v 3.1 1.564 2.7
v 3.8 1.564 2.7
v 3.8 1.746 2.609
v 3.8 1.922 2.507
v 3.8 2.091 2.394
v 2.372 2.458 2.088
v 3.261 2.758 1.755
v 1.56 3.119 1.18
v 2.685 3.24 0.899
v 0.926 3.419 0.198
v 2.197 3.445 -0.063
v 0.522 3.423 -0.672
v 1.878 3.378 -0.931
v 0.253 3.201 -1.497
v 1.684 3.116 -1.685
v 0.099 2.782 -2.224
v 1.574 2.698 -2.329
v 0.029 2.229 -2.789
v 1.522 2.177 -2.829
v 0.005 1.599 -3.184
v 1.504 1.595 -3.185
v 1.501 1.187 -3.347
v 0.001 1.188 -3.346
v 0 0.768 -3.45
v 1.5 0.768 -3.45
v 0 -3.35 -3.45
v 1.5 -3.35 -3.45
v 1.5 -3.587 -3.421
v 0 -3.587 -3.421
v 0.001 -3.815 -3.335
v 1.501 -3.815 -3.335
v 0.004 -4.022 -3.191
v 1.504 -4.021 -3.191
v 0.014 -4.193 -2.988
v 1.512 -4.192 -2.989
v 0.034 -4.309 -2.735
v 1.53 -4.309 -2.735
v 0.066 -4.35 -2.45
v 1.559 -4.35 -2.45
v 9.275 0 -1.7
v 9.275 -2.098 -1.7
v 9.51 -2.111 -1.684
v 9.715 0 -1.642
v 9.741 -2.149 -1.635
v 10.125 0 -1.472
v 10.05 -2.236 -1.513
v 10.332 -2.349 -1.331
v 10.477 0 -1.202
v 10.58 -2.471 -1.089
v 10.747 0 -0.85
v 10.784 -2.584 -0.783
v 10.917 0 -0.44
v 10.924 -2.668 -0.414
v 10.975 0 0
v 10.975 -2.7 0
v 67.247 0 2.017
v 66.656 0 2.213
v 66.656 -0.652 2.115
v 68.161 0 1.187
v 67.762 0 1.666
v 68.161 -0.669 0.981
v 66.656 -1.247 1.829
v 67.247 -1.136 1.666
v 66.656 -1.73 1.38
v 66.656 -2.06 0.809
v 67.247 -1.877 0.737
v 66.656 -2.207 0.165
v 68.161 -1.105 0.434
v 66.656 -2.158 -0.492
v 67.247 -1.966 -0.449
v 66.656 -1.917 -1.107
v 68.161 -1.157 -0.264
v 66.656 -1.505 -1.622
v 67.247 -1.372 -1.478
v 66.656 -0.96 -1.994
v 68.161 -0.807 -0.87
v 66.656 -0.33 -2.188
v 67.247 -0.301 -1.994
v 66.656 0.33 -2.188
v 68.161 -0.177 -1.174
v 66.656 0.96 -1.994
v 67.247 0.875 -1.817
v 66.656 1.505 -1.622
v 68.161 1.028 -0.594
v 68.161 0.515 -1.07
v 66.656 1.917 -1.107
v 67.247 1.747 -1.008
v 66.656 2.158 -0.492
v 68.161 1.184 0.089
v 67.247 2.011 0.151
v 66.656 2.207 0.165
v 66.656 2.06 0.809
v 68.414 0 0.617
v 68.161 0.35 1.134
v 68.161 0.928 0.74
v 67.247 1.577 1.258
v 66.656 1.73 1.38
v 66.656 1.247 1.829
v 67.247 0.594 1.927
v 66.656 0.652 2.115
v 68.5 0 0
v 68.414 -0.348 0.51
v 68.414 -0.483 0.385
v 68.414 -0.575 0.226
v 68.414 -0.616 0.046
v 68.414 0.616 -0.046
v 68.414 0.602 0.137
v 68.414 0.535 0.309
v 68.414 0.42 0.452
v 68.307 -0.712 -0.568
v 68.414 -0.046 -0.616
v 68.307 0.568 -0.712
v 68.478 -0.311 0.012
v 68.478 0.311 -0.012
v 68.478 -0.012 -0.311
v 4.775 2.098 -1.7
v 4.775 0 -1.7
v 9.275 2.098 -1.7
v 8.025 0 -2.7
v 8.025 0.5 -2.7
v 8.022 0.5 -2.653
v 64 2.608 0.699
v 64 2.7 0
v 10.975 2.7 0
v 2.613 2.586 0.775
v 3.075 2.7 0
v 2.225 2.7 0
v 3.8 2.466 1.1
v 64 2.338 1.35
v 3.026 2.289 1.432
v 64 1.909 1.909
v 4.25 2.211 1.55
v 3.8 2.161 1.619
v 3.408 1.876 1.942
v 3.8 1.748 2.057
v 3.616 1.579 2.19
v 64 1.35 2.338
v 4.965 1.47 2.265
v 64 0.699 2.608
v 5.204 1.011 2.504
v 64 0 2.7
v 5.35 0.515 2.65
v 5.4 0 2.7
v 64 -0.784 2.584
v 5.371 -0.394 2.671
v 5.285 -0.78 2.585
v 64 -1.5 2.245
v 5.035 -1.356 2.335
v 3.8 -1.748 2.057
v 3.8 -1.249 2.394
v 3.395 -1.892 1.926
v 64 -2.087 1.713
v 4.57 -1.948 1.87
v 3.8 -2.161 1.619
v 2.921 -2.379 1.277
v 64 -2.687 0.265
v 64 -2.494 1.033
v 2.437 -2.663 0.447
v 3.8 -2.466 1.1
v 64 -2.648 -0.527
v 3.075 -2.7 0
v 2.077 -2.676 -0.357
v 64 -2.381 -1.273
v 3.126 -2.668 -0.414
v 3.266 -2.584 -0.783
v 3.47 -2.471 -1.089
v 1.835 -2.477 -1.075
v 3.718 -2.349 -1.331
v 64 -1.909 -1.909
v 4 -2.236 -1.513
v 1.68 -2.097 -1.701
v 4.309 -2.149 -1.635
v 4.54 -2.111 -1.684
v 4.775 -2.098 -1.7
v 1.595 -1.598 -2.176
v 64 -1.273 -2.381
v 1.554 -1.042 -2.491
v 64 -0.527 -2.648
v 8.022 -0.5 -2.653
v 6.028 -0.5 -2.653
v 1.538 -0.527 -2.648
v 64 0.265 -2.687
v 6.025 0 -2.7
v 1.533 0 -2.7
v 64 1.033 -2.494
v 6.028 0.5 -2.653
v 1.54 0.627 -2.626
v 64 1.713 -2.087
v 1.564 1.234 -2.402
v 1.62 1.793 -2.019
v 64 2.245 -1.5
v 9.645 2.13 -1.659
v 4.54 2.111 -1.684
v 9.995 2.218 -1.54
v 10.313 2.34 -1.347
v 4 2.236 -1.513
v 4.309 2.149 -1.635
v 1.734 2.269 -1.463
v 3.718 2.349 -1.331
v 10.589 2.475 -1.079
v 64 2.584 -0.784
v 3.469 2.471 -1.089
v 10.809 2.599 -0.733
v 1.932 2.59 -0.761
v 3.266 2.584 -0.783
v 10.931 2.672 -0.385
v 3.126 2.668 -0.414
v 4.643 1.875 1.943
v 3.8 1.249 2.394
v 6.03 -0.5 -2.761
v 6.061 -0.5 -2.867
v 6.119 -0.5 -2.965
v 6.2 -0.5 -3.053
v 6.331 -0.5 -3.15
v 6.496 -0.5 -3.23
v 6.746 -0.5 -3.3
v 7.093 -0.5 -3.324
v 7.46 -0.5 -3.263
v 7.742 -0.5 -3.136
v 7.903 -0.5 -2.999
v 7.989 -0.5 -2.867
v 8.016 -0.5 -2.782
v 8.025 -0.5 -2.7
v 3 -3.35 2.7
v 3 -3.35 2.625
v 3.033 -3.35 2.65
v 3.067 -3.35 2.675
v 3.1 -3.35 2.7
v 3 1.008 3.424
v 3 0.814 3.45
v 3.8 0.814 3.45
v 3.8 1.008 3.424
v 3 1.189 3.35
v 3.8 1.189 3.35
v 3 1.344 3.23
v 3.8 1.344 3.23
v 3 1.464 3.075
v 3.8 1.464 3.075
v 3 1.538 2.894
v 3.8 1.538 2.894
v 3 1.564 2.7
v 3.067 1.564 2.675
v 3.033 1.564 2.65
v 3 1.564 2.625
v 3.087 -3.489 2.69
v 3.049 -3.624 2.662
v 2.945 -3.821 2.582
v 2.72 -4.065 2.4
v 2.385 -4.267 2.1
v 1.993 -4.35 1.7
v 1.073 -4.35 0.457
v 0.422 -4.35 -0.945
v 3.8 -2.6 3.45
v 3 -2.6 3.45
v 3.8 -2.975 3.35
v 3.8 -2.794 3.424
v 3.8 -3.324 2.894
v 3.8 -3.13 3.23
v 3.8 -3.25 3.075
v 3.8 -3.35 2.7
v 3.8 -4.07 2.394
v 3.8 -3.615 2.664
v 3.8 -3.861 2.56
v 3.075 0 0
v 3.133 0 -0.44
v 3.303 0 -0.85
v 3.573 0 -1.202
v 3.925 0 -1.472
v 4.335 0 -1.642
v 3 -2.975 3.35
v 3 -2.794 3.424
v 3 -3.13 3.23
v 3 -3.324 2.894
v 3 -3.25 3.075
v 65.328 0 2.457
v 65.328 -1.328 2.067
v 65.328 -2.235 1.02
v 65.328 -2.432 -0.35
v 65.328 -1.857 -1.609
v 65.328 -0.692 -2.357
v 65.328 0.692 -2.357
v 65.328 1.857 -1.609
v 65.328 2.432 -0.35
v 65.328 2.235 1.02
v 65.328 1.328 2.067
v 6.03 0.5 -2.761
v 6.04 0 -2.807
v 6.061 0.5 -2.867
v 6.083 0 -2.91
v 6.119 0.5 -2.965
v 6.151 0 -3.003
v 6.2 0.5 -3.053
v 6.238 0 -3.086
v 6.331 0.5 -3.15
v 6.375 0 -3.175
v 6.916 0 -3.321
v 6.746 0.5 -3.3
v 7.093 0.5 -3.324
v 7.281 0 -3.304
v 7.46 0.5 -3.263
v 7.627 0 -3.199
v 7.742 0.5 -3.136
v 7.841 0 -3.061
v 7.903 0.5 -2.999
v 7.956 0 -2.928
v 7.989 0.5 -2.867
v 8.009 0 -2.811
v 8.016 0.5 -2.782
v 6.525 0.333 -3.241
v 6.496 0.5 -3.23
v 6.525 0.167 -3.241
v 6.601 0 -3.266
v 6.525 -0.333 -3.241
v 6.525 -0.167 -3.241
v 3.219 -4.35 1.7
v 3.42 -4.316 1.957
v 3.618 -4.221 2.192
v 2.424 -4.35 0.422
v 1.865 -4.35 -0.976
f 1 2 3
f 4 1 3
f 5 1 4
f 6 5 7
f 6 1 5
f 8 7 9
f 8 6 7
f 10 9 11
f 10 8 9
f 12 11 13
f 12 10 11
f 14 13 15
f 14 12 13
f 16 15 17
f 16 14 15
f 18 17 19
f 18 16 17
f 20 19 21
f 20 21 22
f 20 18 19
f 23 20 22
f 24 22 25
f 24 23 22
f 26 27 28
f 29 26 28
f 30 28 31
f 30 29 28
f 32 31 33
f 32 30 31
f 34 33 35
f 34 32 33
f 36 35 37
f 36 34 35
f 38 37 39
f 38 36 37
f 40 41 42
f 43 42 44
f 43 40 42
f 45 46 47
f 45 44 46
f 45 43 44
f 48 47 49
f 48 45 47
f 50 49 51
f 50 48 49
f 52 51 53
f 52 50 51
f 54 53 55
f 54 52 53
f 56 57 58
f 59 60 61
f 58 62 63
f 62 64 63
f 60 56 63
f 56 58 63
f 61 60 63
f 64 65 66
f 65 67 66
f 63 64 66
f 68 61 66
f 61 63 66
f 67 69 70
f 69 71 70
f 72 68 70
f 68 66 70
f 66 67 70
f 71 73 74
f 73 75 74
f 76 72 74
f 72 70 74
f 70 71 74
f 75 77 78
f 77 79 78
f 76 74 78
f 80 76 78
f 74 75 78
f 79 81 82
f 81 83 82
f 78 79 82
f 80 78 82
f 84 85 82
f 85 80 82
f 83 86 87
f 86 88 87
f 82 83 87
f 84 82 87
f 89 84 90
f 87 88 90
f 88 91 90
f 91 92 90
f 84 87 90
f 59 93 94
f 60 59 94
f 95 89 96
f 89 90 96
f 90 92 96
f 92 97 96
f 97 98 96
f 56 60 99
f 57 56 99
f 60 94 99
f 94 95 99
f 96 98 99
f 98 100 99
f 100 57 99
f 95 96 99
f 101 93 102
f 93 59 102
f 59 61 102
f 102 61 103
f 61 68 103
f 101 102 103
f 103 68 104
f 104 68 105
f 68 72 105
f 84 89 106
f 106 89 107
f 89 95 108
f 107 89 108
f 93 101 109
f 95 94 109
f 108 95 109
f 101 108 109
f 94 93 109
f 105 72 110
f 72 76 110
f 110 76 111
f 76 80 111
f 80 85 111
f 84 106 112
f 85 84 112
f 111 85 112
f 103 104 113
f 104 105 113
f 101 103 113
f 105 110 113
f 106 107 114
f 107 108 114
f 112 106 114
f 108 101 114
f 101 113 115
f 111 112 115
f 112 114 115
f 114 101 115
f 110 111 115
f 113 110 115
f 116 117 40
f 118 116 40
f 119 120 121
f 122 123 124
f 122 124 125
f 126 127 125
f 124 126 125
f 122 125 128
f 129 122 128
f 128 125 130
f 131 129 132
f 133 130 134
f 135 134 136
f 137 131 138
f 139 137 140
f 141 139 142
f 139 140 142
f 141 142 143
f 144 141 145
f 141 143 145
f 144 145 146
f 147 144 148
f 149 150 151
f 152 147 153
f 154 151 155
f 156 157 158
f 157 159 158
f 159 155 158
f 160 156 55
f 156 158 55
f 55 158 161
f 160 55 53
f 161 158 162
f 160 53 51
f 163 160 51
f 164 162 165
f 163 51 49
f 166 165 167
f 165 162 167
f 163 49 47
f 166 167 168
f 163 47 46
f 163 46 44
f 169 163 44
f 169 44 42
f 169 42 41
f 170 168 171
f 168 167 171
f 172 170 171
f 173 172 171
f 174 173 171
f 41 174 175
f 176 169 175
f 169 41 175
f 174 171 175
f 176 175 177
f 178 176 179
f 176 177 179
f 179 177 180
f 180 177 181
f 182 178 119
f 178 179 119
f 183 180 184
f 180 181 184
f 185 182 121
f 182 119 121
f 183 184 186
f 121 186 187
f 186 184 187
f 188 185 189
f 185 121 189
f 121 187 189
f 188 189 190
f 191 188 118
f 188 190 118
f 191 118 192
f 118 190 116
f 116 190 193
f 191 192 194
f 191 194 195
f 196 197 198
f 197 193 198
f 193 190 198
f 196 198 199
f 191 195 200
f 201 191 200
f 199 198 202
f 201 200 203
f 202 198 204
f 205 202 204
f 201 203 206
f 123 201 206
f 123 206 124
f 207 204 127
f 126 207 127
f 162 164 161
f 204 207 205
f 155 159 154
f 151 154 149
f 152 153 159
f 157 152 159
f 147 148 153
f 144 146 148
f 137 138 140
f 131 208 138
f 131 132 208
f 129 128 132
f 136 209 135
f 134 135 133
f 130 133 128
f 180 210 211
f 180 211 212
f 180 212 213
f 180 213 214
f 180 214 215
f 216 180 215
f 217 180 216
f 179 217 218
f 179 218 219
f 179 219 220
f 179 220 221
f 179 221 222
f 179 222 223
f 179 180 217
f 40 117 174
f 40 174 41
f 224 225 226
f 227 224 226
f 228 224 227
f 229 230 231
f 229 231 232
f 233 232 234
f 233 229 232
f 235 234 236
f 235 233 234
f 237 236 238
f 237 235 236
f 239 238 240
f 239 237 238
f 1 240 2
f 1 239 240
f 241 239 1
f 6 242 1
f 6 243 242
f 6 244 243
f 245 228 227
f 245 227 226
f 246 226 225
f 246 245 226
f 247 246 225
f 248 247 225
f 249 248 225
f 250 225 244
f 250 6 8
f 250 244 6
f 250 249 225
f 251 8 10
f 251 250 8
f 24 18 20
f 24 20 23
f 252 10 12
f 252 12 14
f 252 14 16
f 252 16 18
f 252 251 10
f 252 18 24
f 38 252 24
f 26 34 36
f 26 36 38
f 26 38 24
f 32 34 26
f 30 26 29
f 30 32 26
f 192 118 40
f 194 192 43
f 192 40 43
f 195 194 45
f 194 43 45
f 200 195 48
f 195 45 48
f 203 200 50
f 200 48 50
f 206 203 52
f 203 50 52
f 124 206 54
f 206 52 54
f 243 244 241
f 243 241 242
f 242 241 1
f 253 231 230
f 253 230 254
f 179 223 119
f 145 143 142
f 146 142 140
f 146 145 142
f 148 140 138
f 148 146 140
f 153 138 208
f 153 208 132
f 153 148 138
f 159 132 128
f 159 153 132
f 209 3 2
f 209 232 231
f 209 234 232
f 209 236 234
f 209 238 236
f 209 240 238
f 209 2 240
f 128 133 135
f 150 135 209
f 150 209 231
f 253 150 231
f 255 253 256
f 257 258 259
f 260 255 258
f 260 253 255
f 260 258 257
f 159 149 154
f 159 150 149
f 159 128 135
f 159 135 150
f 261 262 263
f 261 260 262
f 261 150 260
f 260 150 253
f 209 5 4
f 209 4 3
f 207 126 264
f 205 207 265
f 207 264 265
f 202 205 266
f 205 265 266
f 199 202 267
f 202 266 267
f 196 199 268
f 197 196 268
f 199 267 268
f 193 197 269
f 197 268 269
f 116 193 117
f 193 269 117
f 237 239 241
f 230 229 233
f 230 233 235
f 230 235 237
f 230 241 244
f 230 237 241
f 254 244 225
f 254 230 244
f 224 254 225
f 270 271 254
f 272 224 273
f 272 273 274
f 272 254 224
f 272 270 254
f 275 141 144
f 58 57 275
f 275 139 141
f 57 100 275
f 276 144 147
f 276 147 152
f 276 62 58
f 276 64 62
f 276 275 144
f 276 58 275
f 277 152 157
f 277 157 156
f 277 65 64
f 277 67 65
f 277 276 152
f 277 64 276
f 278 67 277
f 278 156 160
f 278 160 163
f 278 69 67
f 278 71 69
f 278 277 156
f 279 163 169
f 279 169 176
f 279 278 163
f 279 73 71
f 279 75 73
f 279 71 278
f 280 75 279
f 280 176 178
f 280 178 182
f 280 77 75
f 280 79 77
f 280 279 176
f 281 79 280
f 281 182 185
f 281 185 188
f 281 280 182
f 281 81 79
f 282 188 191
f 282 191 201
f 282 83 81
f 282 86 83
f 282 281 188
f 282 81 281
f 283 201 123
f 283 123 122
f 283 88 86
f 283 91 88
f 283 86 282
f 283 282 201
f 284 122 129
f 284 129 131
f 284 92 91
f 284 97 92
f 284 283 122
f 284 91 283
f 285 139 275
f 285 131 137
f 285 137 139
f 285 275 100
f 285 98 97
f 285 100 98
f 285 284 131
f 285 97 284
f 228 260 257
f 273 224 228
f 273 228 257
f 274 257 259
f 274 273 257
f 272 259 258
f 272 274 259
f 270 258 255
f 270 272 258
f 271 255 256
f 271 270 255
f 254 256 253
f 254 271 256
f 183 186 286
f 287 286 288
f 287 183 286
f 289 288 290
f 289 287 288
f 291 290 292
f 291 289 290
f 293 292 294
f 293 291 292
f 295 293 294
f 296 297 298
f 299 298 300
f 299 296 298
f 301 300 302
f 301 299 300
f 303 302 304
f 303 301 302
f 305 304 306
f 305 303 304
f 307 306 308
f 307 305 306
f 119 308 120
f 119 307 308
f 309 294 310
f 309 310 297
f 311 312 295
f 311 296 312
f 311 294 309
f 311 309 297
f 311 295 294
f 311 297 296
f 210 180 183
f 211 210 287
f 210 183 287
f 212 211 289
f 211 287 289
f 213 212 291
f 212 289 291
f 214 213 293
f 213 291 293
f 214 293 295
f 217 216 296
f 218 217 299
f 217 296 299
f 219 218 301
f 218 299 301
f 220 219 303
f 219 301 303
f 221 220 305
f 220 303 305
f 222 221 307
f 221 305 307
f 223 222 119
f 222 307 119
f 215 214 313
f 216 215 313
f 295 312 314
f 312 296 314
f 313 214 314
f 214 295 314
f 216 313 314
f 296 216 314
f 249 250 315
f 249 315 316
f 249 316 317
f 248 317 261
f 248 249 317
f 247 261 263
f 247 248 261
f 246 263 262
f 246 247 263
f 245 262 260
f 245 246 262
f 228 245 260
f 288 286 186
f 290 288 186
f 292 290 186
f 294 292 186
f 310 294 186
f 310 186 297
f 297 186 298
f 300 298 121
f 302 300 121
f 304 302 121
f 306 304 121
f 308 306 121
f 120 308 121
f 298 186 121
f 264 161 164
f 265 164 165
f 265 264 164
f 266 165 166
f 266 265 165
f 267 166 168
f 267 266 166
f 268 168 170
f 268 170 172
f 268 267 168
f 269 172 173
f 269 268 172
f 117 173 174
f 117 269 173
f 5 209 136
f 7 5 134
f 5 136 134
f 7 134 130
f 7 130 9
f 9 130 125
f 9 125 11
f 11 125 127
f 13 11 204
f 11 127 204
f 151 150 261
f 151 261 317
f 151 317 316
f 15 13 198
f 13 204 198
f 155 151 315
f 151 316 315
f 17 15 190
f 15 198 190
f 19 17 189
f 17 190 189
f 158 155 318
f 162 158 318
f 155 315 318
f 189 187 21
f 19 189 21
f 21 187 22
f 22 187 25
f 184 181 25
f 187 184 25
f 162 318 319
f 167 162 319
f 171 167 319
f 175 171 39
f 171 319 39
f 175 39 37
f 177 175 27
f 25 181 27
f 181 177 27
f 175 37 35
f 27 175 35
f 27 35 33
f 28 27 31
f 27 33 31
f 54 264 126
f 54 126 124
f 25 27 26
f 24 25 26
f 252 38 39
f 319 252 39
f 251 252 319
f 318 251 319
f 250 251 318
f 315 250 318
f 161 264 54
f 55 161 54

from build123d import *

# Parameters (mm, degrees)
SKETCH_R             = 2.7
PAD_DEPTH            = 68.5
PAD001_DEPTH         = 4.35
PAD001_DEPTH_BACK    = 10
POCKET_DEPTH         = 10
POCKET001_DEPTH      = 10
POCKET002_DEPTH      = 200
SKETCH005_W          = 4.914
SKETCH005_H          = 0.8
PAD002_DEPTH         = 0.75
PAD002_DEPTH_BACK    = 0.25
POCKET003_DEPTH      = 5
PAD003_DEPTH         = 0.5
PAD003_DEPTH_BACK    = 0.5
POCKET004_DEPTH      = 10
POCKET004_DEPTH_BACK = -10


with BuildPart() as part:
    # Sketch → Pad (new body)
    with BuildSketch(Plane.YZ):
        Circle(SKETCH_R)
    extrude(amount=PAD_DEPTH)

    # Sketch001 → Pad001 (join, two sides)
    with BuildSketch(Plane.XZ) as pad001_sk:
        with BuildLine():
            ThreePointArc((3.1, 2.7), (0.818819, -0.006437), (0, -3.45))
            Line((1.5, -3.45), (0, -3.45))
            ThreePointArc((4.1, 2.7), (2.176706, -0.111494), (1.5, -3.45))
            Line((3.1, 2.7), (4.1, 2.7))
        make_face()
    extrude(amount=PAD001_DEPTH)
    extrude(pad001_sk.sketch, amount=-PAD001_DEPTH_BACK)

    # Sketch002 (on Face2 of Pad001) → Pocket (cut)
    with BuildSketch(Plane(origin=(0, 0, 0), x_dir=(0, 1, 0), z_dir=(-1, 0, 0))):
        with BuildLine():
            ThreePointArc((-4.35, -1.7), (-4.057107, -2.407107), (-3.35, -2.7))
            Line((-4.35, -2.7), (-3.35, -2.7))
            Line((-4.35, -1.7), (-4.35, -2.7))
        make_face()
        with BuildLine():
            ThreePointArc((-3.35, 3.45), (-4.057107, 3.157107), (-4.35, 2.45))
            Line((-4.35, 2.45), (-4.35, 3.45))
            Line((-4.35, 3.45), (-3.35, 3.45))
        make_face()
        with BuildLine():
            ThreePointArc((1.564, -2.7), (3.423276, 0.667161), (0.768, 3.45))
            Line((0.768, 3.45), (10, 3.45))
            Line((10, 3.45), (10, -2.7))
            Line((10, -2.7), (1.564, -2.7))
        make_face()
    extrude(amount=-POCKET_DEPTH, mode=Mode.SUBTRACT)

    # Sketch003 (on Face6 of Pad001) → Pocket001 (cut)
    with BuildSketch(Plane(origin=(0, -4.35, 0), x_dir=(0, 0, -1), z_dir=(0, -1, 0))):
        with BuildLine():
            Line((-2.7, 3.1), (-2.7, -1))
            Line((-2.7, -1), (3.45, -1))
            Line((3.45, -1), (3.45, 0))
            ThreePointArc((-2.7, 3.1), (0.006437, 0.818819), (3.45, 0))
        make_face()
    extrude(amount=-POCKET001_DEPTH, mode=Mode.SUBTRACT)

    # Sketch004 (on Face4 of Pocket001) → Pocket002 (cut)
    with BuildSketch(Plane(origin=(0, -4.35, 0), x_dir=(0, 0, -1), z_dir=(0, -1, 0))):
        Polygon((-2.7, 4.175736), (-2.7, 4.551472), (-2.7, 5.4), (-1.1, 3.8), (-1.948528, 3.8), (-2.7, 3.8), align=None)
    extrude(amount=-POCKET002_DEPTH, mode=Mode.SUBTRACT)

    # Sketch005 (on Face6 of Pocket002) → Pad002 (join, two sides)
    with BuildSketch(Plane(origin=(0, 0, 2.7), x_dir=(0, -1, 0), z_dir=(0, 0, 1))) as pad002_sk:
        with Locations((0.893, 3.4)):
            Rectangle(SKETCH005_W, SKETCH005_H)
    extrude(amount=PAD002_DEPTH)
    extrude(pad002_sk.sketch, amount=-PAD002_DEPTH_BACK)

    # Sketch006 (on Face8 of Pad002) → Pocket003 (cut)
    with BuildSketch(Plane(origin=(3, 0, 0), x_dir=(0, 1, 0), z_dir=(-1, 0, 0))):
        with BuildLine():
            ThreePointArc((-3.35, -2.7), (-3.13033, -3.23033), (-2.6, -3.45))
            Line((-3.35, -3.45), (-2.6, -3.45))
            Line((-3.35, -2.7), (-3.35, -3.45))
        make_face()
        with BuildLine():
            ThreePointArc((0.814, -3.45), (1.34433, -3.23033), (1.564, -2.7))
            Line((1.564, -3.45), (1.564, -2.7))
            Line((0.814, -3.45), (1.564, -3.45))
        make_face()
    extrude(amount=-POCKET003_DEPTH, mode=Mode.SUBTRACT)

    # Sketch007 → Pad003 (join, two sides)
    with BuildSketch(Plane.XZ) as pad003_sk:
        with BuildLine():
            add(Edge.make_bspline(
                [(8.025, -2.7), (8.025, -1.617468), (6.525, -2.158734), (5.025, -2.7), (6.525, -3.241266), (8.025, -3.782532), (8.025, -2.7)],
                knots=[0, 0, 0, 2.094395, 2.094395, 4.18879, 4.18879, 6.283185, 6.283185, 6.283185], degree=2, weights=[1, 0.5, 1, 0.5, 1, 0.5, 1]))
        make_face()
    extrude(amount=PAD003_DEPTH)
    extrude(pad003_sk.sketch, amount=-PAD003_DEPTH_BACK)

    # Sketch008 → Pocket004 (cut, two sides)
    with BuildSketch(Plane.XZ) as pocket004_sk:
        with BuildLine():
            Line((4.775, -1.7), (9.275, -1.7))
            ThreePointArc((9.275, -1.7), (10.477082, -1.202082), (10.975, 0))
            Line((3.075, 0), (10.975, 0))
            ThreePointArc((3.075, 0), (3.572918, -1.202082), (4.775, -1.7))
        make_face()
    extrude(amount=-POCKET004_DEPTH, mode=Mode.SUBTRACT)
    extrude(pocket004_sk.sketch, amount=-POCKET004_DEPTH_BACK, mode=Mode.SUBTRACT)

    # Sketch009 → Groove (revolve, cut)
    with BuildSketch(Plane.XZ):
        with BuildLine():
            Line((68.5, 2.7), (64, 2.7))
            Line((64, 2.7), (66.655738, 2.213114))
            ThreePointArc((68.5, 0), (67.978498, 1.440414), (66.655738, 2.213114))
            Line((69.5, 0), (68.5, 0))
            Line((69.5, 2.7), (69.5, 0))
            Line((68.5, 2.7), (69.5, 2.7))
        make_face()
    revolve(axis=Axis((0, 0, 0), (1, 0, 0)), mode=Mode.SUBTRACT)


solid = part.part
